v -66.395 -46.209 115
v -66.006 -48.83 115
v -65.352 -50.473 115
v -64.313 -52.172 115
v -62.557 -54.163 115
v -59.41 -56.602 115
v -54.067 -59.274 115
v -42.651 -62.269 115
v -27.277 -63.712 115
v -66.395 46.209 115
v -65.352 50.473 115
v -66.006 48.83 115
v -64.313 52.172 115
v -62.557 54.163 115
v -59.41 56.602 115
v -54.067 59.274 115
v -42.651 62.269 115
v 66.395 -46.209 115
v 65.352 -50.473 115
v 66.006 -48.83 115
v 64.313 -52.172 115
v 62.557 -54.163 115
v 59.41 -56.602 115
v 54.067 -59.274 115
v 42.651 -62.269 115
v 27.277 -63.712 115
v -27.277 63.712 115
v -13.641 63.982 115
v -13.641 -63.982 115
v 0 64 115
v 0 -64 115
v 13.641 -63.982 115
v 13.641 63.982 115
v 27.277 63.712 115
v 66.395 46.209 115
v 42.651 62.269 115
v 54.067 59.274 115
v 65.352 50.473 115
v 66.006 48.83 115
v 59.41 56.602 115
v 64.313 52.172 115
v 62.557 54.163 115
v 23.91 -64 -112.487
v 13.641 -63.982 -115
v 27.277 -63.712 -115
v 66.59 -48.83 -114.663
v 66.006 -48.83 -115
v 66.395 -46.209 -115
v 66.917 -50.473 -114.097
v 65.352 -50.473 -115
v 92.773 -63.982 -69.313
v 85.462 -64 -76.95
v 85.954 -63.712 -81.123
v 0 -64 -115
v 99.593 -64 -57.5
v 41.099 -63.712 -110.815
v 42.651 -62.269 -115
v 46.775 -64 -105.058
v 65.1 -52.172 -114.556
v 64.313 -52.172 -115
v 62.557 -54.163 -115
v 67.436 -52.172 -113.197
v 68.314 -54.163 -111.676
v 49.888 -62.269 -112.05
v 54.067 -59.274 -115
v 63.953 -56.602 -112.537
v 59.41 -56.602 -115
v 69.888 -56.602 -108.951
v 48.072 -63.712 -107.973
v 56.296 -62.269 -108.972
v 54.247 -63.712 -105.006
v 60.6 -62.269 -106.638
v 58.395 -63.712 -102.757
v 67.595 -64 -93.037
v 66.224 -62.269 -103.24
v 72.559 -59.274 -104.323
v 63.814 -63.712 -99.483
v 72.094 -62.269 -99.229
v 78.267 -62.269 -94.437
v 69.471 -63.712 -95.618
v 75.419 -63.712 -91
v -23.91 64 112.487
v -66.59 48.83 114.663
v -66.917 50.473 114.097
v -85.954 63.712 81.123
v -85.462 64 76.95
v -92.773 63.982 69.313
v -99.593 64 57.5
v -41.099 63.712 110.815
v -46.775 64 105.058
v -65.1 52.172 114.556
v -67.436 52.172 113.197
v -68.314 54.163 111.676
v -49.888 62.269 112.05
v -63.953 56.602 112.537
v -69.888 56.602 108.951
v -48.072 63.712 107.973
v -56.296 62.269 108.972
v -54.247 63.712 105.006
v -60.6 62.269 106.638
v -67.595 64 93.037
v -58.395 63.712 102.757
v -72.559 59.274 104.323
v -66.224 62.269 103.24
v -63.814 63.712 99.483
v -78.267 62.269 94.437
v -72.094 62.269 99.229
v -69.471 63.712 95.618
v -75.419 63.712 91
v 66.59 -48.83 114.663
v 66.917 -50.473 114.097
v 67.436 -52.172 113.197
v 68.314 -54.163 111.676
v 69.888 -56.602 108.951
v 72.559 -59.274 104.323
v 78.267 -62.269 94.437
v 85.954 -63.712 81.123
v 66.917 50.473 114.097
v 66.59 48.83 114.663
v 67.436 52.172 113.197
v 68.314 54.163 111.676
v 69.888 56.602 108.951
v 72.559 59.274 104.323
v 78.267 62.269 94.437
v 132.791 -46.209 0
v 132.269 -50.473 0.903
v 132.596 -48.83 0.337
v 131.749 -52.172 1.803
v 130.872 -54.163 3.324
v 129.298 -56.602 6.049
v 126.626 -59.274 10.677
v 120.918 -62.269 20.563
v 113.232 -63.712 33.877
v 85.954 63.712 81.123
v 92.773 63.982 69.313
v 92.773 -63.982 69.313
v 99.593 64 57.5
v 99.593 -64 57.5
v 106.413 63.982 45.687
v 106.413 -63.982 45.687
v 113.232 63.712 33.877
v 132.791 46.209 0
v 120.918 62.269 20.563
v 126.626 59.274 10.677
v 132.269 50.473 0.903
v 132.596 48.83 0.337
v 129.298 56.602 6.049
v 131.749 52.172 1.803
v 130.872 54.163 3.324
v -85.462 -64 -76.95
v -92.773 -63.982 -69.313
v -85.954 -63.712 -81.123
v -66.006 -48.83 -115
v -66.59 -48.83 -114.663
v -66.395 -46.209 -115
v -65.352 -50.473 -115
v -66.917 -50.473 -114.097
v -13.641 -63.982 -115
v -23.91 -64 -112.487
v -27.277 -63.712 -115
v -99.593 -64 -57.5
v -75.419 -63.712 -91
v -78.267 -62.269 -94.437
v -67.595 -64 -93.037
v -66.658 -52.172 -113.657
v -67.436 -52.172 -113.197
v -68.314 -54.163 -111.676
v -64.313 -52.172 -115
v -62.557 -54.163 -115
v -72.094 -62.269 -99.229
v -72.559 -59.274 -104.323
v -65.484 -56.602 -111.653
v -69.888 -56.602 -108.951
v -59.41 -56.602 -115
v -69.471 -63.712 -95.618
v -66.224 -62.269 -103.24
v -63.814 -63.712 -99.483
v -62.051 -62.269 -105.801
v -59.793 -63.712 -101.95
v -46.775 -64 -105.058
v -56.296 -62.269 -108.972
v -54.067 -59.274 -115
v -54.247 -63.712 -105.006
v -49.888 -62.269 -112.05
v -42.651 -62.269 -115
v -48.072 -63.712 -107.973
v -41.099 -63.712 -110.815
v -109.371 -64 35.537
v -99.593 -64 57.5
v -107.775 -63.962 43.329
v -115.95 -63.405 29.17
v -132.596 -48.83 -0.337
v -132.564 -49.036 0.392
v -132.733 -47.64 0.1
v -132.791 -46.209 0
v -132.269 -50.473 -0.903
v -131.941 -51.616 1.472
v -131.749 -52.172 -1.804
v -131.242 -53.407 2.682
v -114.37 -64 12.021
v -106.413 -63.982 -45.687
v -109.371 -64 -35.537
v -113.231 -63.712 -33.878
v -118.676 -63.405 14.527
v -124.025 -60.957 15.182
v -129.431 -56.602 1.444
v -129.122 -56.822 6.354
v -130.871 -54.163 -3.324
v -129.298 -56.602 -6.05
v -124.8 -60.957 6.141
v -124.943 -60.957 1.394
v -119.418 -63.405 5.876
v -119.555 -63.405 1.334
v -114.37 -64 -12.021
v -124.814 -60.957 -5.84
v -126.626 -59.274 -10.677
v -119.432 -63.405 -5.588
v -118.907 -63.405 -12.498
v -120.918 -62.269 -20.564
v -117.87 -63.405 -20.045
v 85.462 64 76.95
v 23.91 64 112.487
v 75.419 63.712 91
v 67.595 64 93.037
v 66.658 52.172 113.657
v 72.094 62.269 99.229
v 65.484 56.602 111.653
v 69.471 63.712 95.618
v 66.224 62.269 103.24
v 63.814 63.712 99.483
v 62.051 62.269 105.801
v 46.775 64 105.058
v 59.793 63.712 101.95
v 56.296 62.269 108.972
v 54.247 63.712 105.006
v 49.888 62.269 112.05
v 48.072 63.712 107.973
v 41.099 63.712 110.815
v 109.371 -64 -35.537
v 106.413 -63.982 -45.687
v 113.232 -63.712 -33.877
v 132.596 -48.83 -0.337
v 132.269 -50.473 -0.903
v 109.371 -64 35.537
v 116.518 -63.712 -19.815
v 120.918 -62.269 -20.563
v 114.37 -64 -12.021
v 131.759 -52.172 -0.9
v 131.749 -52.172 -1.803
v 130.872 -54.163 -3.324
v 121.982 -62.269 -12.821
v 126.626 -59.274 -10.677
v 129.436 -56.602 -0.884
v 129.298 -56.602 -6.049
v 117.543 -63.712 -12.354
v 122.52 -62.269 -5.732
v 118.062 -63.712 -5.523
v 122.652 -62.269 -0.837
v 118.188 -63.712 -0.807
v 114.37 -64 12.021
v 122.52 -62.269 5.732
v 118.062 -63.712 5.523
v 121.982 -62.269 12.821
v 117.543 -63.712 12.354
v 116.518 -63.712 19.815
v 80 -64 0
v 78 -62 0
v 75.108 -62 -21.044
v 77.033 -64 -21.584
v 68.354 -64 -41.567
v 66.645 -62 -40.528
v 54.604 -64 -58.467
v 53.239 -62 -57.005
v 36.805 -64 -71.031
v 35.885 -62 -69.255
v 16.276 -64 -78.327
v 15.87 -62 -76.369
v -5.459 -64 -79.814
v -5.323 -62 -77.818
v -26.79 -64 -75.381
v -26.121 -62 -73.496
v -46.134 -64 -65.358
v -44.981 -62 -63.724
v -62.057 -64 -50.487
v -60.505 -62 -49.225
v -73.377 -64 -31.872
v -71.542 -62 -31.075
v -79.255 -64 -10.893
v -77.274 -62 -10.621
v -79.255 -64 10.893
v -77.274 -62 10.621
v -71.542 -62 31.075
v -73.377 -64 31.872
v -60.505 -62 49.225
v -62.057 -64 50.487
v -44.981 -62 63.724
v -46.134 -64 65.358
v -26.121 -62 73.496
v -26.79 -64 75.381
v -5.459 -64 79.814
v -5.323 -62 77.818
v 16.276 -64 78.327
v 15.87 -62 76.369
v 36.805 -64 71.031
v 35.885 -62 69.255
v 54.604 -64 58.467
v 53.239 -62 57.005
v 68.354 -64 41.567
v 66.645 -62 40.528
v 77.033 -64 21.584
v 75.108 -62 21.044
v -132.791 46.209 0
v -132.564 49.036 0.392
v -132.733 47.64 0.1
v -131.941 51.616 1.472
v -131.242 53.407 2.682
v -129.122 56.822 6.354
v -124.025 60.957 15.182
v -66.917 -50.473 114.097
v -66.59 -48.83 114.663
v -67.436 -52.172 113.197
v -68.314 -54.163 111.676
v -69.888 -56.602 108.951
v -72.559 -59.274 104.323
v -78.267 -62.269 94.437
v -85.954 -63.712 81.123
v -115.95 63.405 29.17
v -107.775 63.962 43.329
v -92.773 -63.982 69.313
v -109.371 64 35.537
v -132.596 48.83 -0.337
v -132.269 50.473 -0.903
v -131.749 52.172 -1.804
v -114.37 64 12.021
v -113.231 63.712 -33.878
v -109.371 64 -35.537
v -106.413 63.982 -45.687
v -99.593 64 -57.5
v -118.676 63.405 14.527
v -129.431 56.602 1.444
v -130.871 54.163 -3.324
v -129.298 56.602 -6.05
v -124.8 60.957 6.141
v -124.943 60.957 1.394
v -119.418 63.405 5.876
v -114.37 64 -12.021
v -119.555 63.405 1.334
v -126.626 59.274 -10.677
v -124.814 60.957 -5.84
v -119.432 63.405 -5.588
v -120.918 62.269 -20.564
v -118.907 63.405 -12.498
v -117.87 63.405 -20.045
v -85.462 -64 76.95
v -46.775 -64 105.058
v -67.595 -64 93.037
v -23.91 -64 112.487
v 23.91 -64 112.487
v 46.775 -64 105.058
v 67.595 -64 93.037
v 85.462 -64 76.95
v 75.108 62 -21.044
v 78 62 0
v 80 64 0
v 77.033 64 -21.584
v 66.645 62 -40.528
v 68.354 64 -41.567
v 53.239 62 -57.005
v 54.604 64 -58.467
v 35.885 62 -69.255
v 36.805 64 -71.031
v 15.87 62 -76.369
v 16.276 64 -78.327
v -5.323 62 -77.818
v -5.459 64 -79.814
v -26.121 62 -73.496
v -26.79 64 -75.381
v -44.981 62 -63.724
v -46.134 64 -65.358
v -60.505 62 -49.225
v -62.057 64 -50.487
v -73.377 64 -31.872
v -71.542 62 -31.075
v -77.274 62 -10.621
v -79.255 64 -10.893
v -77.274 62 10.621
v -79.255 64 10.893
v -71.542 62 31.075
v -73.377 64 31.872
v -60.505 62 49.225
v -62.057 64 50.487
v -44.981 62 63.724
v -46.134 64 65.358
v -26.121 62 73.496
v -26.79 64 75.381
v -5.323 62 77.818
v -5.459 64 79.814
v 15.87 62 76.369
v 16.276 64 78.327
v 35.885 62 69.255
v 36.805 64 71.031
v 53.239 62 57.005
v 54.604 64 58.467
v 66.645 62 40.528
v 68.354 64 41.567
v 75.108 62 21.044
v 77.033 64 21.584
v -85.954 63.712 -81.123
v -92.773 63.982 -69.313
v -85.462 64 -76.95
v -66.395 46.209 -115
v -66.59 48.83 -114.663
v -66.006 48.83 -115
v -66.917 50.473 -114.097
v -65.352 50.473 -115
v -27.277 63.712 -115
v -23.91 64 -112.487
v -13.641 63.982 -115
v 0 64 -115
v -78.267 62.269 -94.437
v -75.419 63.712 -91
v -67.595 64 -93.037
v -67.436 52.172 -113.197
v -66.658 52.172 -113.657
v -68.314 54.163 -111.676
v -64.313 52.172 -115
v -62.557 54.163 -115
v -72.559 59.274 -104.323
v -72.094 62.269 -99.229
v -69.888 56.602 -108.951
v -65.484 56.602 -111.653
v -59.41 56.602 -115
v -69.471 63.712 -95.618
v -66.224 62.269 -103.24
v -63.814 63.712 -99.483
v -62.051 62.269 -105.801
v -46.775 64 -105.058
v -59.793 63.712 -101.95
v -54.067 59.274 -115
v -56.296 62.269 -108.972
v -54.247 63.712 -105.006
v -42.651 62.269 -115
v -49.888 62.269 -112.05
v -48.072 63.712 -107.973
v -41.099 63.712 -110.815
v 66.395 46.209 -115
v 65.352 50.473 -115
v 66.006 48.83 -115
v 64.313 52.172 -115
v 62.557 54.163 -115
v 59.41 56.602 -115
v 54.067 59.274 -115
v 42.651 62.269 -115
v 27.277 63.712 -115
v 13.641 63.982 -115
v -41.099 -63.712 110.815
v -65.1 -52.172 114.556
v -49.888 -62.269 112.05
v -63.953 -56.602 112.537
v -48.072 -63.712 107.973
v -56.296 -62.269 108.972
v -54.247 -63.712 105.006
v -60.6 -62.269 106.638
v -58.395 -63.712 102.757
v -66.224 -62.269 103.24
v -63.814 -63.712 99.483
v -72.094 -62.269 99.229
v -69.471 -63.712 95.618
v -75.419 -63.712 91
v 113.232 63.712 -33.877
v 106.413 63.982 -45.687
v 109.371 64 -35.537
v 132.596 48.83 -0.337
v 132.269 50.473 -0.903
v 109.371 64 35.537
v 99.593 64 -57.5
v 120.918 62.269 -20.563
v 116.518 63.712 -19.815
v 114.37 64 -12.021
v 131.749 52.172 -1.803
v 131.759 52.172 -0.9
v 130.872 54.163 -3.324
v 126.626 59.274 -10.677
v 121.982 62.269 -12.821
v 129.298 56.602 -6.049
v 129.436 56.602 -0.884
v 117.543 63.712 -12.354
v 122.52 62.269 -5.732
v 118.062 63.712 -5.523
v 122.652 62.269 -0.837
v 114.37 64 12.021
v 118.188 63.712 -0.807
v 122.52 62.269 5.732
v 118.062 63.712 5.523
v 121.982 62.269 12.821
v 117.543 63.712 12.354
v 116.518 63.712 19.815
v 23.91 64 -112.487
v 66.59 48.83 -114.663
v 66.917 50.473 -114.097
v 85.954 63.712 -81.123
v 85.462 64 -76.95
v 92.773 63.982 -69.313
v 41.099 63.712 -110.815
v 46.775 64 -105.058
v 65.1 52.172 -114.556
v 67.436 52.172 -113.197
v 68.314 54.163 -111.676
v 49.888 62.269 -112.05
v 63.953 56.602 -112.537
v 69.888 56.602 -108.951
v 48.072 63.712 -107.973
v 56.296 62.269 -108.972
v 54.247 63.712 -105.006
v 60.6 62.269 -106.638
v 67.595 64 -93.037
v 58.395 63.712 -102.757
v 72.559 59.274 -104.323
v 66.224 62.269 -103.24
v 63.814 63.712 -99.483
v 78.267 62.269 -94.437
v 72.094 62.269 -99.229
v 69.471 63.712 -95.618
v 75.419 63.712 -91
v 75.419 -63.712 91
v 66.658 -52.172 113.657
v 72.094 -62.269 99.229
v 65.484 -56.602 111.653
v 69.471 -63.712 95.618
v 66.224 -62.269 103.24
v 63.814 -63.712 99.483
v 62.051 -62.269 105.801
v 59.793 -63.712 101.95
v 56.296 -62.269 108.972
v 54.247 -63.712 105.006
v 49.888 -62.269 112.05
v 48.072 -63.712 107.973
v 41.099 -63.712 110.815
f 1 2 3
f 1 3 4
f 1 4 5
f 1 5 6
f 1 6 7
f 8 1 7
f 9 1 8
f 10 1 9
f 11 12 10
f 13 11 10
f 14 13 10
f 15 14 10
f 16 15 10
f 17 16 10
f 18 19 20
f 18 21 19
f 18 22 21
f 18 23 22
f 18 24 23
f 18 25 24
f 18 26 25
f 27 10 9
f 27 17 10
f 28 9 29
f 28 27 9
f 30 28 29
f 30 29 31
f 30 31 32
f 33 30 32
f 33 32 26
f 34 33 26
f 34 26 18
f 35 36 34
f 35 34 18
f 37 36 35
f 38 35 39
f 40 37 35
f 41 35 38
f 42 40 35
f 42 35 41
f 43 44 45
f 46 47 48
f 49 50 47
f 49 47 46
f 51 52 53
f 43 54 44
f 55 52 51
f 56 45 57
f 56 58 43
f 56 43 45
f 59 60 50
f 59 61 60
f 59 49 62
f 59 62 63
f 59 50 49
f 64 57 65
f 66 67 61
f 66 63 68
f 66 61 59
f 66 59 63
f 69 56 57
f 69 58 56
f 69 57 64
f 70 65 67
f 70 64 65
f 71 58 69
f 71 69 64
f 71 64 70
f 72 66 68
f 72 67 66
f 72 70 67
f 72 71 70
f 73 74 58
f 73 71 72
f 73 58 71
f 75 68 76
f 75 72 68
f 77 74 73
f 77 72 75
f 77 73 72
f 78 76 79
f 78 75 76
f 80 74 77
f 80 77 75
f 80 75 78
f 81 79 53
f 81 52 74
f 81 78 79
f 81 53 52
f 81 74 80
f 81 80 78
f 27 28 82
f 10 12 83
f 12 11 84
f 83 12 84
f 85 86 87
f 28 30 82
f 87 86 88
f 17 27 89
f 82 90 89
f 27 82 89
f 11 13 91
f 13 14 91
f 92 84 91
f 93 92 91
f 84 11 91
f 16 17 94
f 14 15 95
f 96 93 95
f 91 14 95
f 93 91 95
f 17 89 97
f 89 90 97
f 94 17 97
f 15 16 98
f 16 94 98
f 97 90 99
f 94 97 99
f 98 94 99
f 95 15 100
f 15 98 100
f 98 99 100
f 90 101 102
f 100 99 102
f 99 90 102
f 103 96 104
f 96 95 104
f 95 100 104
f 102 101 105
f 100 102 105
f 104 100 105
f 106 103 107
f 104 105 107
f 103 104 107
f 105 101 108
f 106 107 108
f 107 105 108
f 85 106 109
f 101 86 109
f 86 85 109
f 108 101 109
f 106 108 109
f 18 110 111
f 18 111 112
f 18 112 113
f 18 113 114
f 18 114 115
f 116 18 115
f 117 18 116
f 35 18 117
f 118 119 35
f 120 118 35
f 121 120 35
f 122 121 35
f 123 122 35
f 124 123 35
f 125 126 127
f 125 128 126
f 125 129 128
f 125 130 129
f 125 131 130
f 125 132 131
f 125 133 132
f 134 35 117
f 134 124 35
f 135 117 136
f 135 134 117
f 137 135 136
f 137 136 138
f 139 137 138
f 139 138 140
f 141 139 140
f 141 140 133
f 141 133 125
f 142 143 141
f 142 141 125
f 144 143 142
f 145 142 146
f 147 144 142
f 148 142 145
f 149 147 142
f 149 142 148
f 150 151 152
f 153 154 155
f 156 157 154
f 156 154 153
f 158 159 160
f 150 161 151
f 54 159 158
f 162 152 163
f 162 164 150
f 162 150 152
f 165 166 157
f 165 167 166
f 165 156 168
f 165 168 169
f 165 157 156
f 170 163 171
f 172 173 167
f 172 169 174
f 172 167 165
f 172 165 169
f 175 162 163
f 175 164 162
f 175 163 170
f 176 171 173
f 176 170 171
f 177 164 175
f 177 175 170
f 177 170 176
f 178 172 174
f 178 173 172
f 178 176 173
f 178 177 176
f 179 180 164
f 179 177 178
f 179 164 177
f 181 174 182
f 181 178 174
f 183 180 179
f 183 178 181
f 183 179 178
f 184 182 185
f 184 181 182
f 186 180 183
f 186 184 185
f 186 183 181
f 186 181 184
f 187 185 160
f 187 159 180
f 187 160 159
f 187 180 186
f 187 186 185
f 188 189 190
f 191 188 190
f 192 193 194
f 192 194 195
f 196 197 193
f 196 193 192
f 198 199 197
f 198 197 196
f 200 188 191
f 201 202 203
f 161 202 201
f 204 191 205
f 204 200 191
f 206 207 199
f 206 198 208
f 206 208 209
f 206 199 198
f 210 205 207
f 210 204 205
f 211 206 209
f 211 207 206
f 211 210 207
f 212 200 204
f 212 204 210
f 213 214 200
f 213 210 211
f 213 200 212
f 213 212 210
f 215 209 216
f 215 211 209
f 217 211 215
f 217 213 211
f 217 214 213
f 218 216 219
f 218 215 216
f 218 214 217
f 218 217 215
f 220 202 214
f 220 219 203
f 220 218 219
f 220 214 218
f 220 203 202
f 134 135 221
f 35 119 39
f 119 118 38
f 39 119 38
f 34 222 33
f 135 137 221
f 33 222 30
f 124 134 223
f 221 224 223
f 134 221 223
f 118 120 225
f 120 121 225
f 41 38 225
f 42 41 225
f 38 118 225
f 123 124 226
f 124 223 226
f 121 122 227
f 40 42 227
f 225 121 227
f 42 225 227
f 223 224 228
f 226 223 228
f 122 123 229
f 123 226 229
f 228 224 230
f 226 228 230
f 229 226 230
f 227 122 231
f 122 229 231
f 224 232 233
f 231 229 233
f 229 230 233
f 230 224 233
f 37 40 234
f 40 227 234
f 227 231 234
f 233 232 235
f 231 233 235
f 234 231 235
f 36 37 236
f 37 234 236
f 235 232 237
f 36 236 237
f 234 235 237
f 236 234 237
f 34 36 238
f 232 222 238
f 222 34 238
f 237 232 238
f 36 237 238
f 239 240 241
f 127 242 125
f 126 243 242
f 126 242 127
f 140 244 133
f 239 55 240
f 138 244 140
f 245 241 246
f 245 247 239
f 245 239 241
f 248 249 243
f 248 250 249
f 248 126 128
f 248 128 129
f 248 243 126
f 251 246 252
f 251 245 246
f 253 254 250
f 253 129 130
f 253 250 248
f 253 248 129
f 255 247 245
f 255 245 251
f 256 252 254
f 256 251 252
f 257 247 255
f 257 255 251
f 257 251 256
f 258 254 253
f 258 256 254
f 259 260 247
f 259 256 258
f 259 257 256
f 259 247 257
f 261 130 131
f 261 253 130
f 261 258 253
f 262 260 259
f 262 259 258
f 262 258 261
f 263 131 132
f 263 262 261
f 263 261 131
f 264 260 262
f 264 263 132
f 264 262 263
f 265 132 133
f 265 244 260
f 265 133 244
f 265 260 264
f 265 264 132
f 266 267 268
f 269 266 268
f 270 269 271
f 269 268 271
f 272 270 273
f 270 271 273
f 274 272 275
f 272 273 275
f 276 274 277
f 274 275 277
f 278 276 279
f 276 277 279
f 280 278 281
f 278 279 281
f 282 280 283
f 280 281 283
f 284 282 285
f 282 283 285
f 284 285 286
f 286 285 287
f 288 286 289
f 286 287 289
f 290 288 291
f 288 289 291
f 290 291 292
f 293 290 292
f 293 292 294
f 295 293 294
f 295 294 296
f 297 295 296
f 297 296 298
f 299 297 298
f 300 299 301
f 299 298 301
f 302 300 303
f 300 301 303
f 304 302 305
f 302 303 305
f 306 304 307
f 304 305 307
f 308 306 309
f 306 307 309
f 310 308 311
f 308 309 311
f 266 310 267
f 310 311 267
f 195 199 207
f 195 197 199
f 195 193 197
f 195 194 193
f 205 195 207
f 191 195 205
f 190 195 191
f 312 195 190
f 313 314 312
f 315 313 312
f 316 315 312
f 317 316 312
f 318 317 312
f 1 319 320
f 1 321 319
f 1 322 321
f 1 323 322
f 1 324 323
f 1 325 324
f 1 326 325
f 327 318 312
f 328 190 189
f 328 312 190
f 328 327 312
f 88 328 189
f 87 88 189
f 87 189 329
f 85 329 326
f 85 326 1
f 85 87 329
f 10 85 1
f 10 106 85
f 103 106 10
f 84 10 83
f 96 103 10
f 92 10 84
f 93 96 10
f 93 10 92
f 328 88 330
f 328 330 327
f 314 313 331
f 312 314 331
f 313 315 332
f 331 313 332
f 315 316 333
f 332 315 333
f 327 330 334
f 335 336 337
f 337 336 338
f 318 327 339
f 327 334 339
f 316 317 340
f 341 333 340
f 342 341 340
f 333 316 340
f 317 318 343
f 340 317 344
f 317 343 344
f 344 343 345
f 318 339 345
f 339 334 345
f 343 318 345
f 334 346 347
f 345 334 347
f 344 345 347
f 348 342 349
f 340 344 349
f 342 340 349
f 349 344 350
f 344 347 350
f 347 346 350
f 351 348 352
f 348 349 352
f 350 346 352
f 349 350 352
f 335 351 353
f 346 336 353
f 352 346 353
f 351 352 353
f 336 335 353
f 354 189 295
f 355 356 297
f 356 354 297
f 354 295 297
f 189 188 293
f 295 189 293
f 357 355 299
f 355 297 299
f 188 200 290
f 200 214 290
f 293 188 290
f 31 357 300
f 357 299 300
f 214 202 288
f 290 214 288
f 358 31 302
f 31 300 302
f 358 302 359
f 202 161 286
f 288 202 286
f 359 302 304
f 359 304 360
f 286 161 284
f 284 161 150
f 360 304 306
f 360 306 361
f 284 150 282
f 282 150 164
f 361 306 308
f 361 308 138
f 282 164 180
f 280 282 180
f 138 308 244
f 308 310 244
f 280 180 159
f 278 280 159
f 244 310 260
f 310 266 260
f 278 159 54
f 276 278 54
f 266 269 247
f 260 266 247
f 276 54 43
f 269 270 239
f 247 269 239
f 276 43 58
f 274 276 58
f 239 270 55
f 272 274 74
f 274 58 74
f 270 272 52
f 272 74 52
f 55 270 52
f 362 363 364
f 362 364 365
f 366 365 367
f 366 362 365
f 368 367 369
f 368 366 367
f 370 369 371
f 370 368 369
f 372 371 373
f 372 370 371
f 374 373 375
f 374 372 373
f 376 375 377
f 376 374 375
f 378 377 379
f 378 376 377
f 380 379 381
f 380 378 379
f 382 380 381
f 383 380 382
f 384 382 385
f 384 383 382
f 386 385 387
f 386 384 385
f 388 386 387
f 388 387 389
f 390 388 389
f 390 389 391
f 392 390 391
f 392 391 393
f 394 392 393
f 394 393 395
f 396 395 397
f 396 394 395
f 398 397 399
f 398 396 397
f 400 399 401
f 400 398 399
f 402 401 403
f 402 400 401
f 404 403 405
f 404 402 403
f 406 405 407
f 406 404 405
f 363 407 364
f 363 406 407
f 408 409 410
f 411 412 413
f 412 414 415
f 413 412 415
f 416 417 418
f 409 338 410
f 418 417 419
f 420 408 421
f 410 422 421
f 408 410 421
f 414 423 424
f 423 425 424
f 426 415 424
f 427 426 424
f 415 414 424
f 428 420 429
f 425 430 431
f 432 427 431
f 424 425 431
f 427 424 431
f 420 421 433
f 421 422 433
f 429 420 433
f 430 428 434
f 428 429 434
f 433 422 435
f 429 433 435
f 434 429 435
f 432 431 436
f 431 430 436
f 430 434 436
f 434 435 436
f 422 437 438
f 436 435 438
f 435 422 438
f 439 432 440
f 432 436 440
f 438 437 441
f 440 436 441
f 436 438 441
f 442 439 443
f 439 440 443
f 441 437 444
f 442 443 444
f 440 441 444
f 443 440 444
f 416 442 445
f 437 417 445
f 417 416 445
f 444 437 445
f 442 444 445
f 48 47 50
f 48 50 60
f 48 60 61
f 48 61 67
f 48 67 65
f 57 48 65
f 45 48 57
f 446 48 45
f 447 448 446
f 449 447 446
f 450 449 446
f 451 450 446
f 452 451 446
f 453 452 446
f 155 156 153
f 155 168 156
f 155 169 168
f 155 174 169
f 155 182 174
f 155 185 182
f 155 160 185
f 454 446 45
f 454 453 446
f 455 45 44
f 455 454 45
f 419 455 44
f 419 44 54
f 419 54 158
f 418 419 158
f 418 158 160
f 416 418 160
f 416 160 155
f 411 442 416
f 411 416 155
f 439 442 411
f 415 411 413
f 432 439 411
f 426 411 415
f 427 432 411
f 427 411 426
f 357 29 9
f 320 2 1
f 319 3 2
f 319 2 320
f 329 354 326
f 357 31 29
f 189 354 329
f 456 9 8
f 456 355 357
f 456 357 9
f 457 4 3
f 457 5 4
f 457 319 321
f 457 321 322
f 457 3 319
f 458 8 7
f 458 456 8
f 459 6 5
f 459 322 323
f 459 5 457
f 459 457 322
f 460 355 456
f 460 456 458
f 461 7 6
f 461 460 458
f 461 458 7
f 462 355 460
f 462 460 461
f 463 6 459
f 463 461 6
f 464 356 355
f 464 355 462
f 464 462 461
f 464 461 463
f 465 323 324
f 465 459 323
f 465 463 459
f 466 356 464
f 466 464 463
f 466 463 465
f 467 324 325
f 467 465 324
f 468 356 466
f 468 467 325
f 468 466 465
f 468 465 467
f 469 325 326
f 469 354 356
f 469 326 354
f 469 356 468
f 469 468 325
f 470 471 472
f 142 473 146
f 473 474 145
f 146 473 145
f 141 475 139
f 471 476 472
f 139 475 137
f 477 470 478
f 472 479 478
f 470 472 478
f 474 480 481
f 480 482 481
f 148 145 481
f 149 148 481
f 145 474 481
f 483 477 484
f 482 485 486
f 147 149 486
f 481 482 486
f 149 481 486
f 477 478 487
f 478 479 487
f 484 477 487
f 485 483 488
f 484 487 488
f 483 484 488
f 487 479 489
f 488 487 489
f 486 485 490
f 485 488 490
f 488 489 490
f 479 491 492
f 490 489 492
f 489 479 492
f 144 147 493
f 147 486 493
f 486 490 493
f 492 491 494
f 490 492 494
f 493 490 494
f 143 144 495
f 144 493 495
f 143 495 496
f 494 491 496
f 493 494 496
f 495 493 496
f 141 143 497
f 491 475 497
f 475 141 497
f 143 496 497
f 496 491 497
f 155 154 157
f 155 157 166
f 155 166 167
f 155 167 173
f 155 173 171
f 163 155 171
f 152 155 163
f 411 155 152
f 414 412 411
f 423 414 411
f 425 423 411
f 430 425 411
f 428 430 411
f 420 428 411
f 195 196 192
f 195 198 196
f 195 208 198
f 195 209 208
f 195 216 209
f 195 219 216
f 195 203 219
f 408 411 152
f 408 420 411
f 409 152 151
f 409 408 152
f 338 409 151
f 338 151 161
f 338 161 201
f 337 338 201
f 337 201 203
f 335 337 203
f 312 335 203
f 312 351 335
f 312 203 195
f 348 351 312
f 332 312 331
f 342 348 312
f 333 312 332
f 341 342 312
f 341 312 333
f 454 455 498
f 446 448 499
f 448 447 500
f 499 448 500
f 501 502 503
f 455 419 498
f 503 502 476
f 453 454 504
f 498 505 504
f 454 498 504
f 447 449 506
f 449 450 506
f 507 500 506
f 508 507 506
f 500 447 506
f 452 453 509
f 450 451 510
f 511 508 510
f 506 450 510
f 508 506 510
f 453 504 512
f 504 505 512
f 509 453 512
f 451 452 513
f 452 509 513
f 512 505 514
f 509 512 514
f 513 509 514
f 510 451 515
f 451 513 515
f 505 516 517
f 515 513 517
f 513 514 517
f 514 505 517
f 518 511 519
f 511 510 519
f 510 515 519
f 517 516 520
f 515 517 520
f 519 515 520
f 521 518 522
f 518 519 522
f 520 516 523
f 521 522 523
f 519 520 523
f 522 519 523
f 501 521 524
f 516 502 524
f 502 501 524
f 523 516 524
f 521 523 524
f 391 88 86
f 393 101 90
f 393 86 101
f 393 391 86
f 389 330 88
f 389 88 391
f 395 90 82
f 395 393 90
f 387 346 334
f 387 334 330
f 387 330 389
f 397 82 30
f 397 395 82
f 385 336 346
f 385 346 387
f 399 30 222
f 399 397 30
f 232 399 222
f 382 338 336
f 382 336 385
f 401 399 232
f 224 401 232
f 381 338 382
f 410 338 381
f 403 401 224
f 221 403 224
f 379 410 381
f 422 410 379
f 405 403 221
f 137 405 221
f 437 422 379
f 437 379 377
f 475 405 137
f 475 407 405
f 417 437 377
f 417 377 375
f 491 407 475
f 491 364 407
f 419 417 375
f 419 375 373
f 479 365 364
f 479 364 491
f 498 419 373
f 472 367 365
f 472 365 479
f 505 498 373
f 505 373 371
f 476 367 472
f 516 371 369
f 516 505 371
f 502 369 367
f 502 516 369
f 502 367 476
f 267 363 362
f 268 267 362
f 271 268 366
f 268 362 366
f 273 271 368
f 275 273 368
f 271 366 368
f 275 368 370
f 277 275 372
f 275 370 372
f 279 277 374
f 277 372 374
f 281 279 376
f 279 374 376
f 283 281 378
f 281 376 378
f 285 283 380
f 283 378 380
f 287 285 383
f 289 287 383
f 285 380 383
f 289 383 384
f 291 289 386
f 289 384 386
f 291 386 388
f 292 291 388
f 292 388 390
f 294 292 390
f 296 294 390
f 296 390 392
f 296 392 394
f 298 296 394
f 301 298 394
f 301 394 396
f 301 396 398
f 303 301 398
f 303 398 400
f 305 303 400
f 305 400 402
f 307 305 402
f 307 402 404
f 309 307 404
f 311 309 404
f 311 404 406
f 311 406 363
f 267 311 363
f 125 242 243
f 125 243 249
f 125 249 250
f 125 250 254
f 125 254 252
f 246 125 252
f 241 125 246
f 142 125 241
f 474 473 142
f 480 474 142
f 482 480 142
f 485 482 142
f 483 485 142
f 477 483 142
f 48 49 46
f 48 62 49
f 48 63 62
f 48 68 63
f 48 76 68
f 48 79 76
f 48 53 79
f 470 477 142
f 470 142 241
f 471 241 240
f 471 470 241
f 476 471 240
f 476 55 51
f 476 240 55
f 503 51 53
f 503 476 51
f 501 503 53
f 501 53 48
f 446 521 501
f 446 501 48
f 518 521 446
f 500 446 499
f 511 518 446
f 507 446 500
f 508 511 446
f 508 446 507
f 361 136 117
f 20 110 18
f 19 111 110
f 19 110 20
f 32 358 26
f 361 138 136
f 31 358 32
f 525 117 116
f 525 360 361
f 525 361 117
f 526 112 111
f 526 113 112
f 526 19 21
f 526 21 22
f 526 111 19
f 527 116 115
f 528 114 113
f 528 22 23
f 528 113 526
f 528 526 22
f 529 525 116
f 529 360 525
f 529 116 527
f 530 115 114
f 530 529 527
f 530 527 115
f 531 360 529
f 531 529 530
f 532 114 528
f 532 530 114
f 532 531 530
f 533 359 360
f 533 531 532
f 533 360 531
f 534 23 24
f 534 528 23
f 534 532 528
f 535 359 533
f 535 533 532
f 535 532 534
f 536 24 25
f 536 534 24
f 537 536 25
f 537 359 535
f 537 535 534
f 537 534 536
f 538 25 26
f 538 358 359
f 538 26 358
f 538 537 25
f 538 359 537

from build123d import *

# Parameters (mm, degrees)
BOSS_EXTRUDE1_DEPTH = 64
SKETCH6_R           = 78
CUT_EXTRUDE1_DEPTH  = 129.000000101
CHAMFER1_SIZE       = 2


with BuildPart() as part:
    # Sketch1 → Boss-Extrude1 (new body, symmetric)
    with BuildSketch(Plane(origin=(0, 0, 0), x_dir=(1, 0, 0), z_dir=(0, 1, 0))):
        Polygon((132.790561914, 0), (66.395280957, 115), (-66.395280957, 115), (-132.790561914, 0), (-66.395280957, -115), (66.395280957, -115), align=None)
    extrude(amount=BOSS_EXTRUDE1_DEPTH, both=True)

    # Sketch3 → Cut-Revolve1 (revolve, cut)
    with BuildSketch(Plane.XY):
        with BuildLine():
            Line((-132.790561914, 64), (-132.790561914, 46.209438086))
            ThreePointArc((-132.790561914, 46.209438086), (-127.57982697, 58.789265057), (-115, 64))
            Line((-115, 64), (-132.790561914, 64))
        make_face()
    cut_revolve1 = revolve(axis=Axis((0, -11.068960952, 0), (0, -1, 0)), mode=Mode.SUBTRACT)

    # Mirror1: Cut-Revolve1 across plane
    add(cut_revolve1.mirror(Plane.ZX), mode=Mode.SUBTRACT)

    # Sketch6 → Cut-Extrude1 (cut, through all)
    with BuildSketch(Plane(origin=(0, 64, 0), x_dir=(1, 0, 0), z_dir=(0, 1, 0))):
        Circle(SKETCH6_R)
    extrude(amount=-CUT_EXTRUDE1_DEPTH, mode=Mode.SUBTRACT)

    # Chamfer1
    chamfer1_edges = [part.edges().sort_by_distance(p)[0] for p in [
        (-78, -64, 0),
        (-78, 64, 0),
    ]]
    chamfer(chamfer1_edges, length=CHAMFER1_SIZE)


solid = part.part
